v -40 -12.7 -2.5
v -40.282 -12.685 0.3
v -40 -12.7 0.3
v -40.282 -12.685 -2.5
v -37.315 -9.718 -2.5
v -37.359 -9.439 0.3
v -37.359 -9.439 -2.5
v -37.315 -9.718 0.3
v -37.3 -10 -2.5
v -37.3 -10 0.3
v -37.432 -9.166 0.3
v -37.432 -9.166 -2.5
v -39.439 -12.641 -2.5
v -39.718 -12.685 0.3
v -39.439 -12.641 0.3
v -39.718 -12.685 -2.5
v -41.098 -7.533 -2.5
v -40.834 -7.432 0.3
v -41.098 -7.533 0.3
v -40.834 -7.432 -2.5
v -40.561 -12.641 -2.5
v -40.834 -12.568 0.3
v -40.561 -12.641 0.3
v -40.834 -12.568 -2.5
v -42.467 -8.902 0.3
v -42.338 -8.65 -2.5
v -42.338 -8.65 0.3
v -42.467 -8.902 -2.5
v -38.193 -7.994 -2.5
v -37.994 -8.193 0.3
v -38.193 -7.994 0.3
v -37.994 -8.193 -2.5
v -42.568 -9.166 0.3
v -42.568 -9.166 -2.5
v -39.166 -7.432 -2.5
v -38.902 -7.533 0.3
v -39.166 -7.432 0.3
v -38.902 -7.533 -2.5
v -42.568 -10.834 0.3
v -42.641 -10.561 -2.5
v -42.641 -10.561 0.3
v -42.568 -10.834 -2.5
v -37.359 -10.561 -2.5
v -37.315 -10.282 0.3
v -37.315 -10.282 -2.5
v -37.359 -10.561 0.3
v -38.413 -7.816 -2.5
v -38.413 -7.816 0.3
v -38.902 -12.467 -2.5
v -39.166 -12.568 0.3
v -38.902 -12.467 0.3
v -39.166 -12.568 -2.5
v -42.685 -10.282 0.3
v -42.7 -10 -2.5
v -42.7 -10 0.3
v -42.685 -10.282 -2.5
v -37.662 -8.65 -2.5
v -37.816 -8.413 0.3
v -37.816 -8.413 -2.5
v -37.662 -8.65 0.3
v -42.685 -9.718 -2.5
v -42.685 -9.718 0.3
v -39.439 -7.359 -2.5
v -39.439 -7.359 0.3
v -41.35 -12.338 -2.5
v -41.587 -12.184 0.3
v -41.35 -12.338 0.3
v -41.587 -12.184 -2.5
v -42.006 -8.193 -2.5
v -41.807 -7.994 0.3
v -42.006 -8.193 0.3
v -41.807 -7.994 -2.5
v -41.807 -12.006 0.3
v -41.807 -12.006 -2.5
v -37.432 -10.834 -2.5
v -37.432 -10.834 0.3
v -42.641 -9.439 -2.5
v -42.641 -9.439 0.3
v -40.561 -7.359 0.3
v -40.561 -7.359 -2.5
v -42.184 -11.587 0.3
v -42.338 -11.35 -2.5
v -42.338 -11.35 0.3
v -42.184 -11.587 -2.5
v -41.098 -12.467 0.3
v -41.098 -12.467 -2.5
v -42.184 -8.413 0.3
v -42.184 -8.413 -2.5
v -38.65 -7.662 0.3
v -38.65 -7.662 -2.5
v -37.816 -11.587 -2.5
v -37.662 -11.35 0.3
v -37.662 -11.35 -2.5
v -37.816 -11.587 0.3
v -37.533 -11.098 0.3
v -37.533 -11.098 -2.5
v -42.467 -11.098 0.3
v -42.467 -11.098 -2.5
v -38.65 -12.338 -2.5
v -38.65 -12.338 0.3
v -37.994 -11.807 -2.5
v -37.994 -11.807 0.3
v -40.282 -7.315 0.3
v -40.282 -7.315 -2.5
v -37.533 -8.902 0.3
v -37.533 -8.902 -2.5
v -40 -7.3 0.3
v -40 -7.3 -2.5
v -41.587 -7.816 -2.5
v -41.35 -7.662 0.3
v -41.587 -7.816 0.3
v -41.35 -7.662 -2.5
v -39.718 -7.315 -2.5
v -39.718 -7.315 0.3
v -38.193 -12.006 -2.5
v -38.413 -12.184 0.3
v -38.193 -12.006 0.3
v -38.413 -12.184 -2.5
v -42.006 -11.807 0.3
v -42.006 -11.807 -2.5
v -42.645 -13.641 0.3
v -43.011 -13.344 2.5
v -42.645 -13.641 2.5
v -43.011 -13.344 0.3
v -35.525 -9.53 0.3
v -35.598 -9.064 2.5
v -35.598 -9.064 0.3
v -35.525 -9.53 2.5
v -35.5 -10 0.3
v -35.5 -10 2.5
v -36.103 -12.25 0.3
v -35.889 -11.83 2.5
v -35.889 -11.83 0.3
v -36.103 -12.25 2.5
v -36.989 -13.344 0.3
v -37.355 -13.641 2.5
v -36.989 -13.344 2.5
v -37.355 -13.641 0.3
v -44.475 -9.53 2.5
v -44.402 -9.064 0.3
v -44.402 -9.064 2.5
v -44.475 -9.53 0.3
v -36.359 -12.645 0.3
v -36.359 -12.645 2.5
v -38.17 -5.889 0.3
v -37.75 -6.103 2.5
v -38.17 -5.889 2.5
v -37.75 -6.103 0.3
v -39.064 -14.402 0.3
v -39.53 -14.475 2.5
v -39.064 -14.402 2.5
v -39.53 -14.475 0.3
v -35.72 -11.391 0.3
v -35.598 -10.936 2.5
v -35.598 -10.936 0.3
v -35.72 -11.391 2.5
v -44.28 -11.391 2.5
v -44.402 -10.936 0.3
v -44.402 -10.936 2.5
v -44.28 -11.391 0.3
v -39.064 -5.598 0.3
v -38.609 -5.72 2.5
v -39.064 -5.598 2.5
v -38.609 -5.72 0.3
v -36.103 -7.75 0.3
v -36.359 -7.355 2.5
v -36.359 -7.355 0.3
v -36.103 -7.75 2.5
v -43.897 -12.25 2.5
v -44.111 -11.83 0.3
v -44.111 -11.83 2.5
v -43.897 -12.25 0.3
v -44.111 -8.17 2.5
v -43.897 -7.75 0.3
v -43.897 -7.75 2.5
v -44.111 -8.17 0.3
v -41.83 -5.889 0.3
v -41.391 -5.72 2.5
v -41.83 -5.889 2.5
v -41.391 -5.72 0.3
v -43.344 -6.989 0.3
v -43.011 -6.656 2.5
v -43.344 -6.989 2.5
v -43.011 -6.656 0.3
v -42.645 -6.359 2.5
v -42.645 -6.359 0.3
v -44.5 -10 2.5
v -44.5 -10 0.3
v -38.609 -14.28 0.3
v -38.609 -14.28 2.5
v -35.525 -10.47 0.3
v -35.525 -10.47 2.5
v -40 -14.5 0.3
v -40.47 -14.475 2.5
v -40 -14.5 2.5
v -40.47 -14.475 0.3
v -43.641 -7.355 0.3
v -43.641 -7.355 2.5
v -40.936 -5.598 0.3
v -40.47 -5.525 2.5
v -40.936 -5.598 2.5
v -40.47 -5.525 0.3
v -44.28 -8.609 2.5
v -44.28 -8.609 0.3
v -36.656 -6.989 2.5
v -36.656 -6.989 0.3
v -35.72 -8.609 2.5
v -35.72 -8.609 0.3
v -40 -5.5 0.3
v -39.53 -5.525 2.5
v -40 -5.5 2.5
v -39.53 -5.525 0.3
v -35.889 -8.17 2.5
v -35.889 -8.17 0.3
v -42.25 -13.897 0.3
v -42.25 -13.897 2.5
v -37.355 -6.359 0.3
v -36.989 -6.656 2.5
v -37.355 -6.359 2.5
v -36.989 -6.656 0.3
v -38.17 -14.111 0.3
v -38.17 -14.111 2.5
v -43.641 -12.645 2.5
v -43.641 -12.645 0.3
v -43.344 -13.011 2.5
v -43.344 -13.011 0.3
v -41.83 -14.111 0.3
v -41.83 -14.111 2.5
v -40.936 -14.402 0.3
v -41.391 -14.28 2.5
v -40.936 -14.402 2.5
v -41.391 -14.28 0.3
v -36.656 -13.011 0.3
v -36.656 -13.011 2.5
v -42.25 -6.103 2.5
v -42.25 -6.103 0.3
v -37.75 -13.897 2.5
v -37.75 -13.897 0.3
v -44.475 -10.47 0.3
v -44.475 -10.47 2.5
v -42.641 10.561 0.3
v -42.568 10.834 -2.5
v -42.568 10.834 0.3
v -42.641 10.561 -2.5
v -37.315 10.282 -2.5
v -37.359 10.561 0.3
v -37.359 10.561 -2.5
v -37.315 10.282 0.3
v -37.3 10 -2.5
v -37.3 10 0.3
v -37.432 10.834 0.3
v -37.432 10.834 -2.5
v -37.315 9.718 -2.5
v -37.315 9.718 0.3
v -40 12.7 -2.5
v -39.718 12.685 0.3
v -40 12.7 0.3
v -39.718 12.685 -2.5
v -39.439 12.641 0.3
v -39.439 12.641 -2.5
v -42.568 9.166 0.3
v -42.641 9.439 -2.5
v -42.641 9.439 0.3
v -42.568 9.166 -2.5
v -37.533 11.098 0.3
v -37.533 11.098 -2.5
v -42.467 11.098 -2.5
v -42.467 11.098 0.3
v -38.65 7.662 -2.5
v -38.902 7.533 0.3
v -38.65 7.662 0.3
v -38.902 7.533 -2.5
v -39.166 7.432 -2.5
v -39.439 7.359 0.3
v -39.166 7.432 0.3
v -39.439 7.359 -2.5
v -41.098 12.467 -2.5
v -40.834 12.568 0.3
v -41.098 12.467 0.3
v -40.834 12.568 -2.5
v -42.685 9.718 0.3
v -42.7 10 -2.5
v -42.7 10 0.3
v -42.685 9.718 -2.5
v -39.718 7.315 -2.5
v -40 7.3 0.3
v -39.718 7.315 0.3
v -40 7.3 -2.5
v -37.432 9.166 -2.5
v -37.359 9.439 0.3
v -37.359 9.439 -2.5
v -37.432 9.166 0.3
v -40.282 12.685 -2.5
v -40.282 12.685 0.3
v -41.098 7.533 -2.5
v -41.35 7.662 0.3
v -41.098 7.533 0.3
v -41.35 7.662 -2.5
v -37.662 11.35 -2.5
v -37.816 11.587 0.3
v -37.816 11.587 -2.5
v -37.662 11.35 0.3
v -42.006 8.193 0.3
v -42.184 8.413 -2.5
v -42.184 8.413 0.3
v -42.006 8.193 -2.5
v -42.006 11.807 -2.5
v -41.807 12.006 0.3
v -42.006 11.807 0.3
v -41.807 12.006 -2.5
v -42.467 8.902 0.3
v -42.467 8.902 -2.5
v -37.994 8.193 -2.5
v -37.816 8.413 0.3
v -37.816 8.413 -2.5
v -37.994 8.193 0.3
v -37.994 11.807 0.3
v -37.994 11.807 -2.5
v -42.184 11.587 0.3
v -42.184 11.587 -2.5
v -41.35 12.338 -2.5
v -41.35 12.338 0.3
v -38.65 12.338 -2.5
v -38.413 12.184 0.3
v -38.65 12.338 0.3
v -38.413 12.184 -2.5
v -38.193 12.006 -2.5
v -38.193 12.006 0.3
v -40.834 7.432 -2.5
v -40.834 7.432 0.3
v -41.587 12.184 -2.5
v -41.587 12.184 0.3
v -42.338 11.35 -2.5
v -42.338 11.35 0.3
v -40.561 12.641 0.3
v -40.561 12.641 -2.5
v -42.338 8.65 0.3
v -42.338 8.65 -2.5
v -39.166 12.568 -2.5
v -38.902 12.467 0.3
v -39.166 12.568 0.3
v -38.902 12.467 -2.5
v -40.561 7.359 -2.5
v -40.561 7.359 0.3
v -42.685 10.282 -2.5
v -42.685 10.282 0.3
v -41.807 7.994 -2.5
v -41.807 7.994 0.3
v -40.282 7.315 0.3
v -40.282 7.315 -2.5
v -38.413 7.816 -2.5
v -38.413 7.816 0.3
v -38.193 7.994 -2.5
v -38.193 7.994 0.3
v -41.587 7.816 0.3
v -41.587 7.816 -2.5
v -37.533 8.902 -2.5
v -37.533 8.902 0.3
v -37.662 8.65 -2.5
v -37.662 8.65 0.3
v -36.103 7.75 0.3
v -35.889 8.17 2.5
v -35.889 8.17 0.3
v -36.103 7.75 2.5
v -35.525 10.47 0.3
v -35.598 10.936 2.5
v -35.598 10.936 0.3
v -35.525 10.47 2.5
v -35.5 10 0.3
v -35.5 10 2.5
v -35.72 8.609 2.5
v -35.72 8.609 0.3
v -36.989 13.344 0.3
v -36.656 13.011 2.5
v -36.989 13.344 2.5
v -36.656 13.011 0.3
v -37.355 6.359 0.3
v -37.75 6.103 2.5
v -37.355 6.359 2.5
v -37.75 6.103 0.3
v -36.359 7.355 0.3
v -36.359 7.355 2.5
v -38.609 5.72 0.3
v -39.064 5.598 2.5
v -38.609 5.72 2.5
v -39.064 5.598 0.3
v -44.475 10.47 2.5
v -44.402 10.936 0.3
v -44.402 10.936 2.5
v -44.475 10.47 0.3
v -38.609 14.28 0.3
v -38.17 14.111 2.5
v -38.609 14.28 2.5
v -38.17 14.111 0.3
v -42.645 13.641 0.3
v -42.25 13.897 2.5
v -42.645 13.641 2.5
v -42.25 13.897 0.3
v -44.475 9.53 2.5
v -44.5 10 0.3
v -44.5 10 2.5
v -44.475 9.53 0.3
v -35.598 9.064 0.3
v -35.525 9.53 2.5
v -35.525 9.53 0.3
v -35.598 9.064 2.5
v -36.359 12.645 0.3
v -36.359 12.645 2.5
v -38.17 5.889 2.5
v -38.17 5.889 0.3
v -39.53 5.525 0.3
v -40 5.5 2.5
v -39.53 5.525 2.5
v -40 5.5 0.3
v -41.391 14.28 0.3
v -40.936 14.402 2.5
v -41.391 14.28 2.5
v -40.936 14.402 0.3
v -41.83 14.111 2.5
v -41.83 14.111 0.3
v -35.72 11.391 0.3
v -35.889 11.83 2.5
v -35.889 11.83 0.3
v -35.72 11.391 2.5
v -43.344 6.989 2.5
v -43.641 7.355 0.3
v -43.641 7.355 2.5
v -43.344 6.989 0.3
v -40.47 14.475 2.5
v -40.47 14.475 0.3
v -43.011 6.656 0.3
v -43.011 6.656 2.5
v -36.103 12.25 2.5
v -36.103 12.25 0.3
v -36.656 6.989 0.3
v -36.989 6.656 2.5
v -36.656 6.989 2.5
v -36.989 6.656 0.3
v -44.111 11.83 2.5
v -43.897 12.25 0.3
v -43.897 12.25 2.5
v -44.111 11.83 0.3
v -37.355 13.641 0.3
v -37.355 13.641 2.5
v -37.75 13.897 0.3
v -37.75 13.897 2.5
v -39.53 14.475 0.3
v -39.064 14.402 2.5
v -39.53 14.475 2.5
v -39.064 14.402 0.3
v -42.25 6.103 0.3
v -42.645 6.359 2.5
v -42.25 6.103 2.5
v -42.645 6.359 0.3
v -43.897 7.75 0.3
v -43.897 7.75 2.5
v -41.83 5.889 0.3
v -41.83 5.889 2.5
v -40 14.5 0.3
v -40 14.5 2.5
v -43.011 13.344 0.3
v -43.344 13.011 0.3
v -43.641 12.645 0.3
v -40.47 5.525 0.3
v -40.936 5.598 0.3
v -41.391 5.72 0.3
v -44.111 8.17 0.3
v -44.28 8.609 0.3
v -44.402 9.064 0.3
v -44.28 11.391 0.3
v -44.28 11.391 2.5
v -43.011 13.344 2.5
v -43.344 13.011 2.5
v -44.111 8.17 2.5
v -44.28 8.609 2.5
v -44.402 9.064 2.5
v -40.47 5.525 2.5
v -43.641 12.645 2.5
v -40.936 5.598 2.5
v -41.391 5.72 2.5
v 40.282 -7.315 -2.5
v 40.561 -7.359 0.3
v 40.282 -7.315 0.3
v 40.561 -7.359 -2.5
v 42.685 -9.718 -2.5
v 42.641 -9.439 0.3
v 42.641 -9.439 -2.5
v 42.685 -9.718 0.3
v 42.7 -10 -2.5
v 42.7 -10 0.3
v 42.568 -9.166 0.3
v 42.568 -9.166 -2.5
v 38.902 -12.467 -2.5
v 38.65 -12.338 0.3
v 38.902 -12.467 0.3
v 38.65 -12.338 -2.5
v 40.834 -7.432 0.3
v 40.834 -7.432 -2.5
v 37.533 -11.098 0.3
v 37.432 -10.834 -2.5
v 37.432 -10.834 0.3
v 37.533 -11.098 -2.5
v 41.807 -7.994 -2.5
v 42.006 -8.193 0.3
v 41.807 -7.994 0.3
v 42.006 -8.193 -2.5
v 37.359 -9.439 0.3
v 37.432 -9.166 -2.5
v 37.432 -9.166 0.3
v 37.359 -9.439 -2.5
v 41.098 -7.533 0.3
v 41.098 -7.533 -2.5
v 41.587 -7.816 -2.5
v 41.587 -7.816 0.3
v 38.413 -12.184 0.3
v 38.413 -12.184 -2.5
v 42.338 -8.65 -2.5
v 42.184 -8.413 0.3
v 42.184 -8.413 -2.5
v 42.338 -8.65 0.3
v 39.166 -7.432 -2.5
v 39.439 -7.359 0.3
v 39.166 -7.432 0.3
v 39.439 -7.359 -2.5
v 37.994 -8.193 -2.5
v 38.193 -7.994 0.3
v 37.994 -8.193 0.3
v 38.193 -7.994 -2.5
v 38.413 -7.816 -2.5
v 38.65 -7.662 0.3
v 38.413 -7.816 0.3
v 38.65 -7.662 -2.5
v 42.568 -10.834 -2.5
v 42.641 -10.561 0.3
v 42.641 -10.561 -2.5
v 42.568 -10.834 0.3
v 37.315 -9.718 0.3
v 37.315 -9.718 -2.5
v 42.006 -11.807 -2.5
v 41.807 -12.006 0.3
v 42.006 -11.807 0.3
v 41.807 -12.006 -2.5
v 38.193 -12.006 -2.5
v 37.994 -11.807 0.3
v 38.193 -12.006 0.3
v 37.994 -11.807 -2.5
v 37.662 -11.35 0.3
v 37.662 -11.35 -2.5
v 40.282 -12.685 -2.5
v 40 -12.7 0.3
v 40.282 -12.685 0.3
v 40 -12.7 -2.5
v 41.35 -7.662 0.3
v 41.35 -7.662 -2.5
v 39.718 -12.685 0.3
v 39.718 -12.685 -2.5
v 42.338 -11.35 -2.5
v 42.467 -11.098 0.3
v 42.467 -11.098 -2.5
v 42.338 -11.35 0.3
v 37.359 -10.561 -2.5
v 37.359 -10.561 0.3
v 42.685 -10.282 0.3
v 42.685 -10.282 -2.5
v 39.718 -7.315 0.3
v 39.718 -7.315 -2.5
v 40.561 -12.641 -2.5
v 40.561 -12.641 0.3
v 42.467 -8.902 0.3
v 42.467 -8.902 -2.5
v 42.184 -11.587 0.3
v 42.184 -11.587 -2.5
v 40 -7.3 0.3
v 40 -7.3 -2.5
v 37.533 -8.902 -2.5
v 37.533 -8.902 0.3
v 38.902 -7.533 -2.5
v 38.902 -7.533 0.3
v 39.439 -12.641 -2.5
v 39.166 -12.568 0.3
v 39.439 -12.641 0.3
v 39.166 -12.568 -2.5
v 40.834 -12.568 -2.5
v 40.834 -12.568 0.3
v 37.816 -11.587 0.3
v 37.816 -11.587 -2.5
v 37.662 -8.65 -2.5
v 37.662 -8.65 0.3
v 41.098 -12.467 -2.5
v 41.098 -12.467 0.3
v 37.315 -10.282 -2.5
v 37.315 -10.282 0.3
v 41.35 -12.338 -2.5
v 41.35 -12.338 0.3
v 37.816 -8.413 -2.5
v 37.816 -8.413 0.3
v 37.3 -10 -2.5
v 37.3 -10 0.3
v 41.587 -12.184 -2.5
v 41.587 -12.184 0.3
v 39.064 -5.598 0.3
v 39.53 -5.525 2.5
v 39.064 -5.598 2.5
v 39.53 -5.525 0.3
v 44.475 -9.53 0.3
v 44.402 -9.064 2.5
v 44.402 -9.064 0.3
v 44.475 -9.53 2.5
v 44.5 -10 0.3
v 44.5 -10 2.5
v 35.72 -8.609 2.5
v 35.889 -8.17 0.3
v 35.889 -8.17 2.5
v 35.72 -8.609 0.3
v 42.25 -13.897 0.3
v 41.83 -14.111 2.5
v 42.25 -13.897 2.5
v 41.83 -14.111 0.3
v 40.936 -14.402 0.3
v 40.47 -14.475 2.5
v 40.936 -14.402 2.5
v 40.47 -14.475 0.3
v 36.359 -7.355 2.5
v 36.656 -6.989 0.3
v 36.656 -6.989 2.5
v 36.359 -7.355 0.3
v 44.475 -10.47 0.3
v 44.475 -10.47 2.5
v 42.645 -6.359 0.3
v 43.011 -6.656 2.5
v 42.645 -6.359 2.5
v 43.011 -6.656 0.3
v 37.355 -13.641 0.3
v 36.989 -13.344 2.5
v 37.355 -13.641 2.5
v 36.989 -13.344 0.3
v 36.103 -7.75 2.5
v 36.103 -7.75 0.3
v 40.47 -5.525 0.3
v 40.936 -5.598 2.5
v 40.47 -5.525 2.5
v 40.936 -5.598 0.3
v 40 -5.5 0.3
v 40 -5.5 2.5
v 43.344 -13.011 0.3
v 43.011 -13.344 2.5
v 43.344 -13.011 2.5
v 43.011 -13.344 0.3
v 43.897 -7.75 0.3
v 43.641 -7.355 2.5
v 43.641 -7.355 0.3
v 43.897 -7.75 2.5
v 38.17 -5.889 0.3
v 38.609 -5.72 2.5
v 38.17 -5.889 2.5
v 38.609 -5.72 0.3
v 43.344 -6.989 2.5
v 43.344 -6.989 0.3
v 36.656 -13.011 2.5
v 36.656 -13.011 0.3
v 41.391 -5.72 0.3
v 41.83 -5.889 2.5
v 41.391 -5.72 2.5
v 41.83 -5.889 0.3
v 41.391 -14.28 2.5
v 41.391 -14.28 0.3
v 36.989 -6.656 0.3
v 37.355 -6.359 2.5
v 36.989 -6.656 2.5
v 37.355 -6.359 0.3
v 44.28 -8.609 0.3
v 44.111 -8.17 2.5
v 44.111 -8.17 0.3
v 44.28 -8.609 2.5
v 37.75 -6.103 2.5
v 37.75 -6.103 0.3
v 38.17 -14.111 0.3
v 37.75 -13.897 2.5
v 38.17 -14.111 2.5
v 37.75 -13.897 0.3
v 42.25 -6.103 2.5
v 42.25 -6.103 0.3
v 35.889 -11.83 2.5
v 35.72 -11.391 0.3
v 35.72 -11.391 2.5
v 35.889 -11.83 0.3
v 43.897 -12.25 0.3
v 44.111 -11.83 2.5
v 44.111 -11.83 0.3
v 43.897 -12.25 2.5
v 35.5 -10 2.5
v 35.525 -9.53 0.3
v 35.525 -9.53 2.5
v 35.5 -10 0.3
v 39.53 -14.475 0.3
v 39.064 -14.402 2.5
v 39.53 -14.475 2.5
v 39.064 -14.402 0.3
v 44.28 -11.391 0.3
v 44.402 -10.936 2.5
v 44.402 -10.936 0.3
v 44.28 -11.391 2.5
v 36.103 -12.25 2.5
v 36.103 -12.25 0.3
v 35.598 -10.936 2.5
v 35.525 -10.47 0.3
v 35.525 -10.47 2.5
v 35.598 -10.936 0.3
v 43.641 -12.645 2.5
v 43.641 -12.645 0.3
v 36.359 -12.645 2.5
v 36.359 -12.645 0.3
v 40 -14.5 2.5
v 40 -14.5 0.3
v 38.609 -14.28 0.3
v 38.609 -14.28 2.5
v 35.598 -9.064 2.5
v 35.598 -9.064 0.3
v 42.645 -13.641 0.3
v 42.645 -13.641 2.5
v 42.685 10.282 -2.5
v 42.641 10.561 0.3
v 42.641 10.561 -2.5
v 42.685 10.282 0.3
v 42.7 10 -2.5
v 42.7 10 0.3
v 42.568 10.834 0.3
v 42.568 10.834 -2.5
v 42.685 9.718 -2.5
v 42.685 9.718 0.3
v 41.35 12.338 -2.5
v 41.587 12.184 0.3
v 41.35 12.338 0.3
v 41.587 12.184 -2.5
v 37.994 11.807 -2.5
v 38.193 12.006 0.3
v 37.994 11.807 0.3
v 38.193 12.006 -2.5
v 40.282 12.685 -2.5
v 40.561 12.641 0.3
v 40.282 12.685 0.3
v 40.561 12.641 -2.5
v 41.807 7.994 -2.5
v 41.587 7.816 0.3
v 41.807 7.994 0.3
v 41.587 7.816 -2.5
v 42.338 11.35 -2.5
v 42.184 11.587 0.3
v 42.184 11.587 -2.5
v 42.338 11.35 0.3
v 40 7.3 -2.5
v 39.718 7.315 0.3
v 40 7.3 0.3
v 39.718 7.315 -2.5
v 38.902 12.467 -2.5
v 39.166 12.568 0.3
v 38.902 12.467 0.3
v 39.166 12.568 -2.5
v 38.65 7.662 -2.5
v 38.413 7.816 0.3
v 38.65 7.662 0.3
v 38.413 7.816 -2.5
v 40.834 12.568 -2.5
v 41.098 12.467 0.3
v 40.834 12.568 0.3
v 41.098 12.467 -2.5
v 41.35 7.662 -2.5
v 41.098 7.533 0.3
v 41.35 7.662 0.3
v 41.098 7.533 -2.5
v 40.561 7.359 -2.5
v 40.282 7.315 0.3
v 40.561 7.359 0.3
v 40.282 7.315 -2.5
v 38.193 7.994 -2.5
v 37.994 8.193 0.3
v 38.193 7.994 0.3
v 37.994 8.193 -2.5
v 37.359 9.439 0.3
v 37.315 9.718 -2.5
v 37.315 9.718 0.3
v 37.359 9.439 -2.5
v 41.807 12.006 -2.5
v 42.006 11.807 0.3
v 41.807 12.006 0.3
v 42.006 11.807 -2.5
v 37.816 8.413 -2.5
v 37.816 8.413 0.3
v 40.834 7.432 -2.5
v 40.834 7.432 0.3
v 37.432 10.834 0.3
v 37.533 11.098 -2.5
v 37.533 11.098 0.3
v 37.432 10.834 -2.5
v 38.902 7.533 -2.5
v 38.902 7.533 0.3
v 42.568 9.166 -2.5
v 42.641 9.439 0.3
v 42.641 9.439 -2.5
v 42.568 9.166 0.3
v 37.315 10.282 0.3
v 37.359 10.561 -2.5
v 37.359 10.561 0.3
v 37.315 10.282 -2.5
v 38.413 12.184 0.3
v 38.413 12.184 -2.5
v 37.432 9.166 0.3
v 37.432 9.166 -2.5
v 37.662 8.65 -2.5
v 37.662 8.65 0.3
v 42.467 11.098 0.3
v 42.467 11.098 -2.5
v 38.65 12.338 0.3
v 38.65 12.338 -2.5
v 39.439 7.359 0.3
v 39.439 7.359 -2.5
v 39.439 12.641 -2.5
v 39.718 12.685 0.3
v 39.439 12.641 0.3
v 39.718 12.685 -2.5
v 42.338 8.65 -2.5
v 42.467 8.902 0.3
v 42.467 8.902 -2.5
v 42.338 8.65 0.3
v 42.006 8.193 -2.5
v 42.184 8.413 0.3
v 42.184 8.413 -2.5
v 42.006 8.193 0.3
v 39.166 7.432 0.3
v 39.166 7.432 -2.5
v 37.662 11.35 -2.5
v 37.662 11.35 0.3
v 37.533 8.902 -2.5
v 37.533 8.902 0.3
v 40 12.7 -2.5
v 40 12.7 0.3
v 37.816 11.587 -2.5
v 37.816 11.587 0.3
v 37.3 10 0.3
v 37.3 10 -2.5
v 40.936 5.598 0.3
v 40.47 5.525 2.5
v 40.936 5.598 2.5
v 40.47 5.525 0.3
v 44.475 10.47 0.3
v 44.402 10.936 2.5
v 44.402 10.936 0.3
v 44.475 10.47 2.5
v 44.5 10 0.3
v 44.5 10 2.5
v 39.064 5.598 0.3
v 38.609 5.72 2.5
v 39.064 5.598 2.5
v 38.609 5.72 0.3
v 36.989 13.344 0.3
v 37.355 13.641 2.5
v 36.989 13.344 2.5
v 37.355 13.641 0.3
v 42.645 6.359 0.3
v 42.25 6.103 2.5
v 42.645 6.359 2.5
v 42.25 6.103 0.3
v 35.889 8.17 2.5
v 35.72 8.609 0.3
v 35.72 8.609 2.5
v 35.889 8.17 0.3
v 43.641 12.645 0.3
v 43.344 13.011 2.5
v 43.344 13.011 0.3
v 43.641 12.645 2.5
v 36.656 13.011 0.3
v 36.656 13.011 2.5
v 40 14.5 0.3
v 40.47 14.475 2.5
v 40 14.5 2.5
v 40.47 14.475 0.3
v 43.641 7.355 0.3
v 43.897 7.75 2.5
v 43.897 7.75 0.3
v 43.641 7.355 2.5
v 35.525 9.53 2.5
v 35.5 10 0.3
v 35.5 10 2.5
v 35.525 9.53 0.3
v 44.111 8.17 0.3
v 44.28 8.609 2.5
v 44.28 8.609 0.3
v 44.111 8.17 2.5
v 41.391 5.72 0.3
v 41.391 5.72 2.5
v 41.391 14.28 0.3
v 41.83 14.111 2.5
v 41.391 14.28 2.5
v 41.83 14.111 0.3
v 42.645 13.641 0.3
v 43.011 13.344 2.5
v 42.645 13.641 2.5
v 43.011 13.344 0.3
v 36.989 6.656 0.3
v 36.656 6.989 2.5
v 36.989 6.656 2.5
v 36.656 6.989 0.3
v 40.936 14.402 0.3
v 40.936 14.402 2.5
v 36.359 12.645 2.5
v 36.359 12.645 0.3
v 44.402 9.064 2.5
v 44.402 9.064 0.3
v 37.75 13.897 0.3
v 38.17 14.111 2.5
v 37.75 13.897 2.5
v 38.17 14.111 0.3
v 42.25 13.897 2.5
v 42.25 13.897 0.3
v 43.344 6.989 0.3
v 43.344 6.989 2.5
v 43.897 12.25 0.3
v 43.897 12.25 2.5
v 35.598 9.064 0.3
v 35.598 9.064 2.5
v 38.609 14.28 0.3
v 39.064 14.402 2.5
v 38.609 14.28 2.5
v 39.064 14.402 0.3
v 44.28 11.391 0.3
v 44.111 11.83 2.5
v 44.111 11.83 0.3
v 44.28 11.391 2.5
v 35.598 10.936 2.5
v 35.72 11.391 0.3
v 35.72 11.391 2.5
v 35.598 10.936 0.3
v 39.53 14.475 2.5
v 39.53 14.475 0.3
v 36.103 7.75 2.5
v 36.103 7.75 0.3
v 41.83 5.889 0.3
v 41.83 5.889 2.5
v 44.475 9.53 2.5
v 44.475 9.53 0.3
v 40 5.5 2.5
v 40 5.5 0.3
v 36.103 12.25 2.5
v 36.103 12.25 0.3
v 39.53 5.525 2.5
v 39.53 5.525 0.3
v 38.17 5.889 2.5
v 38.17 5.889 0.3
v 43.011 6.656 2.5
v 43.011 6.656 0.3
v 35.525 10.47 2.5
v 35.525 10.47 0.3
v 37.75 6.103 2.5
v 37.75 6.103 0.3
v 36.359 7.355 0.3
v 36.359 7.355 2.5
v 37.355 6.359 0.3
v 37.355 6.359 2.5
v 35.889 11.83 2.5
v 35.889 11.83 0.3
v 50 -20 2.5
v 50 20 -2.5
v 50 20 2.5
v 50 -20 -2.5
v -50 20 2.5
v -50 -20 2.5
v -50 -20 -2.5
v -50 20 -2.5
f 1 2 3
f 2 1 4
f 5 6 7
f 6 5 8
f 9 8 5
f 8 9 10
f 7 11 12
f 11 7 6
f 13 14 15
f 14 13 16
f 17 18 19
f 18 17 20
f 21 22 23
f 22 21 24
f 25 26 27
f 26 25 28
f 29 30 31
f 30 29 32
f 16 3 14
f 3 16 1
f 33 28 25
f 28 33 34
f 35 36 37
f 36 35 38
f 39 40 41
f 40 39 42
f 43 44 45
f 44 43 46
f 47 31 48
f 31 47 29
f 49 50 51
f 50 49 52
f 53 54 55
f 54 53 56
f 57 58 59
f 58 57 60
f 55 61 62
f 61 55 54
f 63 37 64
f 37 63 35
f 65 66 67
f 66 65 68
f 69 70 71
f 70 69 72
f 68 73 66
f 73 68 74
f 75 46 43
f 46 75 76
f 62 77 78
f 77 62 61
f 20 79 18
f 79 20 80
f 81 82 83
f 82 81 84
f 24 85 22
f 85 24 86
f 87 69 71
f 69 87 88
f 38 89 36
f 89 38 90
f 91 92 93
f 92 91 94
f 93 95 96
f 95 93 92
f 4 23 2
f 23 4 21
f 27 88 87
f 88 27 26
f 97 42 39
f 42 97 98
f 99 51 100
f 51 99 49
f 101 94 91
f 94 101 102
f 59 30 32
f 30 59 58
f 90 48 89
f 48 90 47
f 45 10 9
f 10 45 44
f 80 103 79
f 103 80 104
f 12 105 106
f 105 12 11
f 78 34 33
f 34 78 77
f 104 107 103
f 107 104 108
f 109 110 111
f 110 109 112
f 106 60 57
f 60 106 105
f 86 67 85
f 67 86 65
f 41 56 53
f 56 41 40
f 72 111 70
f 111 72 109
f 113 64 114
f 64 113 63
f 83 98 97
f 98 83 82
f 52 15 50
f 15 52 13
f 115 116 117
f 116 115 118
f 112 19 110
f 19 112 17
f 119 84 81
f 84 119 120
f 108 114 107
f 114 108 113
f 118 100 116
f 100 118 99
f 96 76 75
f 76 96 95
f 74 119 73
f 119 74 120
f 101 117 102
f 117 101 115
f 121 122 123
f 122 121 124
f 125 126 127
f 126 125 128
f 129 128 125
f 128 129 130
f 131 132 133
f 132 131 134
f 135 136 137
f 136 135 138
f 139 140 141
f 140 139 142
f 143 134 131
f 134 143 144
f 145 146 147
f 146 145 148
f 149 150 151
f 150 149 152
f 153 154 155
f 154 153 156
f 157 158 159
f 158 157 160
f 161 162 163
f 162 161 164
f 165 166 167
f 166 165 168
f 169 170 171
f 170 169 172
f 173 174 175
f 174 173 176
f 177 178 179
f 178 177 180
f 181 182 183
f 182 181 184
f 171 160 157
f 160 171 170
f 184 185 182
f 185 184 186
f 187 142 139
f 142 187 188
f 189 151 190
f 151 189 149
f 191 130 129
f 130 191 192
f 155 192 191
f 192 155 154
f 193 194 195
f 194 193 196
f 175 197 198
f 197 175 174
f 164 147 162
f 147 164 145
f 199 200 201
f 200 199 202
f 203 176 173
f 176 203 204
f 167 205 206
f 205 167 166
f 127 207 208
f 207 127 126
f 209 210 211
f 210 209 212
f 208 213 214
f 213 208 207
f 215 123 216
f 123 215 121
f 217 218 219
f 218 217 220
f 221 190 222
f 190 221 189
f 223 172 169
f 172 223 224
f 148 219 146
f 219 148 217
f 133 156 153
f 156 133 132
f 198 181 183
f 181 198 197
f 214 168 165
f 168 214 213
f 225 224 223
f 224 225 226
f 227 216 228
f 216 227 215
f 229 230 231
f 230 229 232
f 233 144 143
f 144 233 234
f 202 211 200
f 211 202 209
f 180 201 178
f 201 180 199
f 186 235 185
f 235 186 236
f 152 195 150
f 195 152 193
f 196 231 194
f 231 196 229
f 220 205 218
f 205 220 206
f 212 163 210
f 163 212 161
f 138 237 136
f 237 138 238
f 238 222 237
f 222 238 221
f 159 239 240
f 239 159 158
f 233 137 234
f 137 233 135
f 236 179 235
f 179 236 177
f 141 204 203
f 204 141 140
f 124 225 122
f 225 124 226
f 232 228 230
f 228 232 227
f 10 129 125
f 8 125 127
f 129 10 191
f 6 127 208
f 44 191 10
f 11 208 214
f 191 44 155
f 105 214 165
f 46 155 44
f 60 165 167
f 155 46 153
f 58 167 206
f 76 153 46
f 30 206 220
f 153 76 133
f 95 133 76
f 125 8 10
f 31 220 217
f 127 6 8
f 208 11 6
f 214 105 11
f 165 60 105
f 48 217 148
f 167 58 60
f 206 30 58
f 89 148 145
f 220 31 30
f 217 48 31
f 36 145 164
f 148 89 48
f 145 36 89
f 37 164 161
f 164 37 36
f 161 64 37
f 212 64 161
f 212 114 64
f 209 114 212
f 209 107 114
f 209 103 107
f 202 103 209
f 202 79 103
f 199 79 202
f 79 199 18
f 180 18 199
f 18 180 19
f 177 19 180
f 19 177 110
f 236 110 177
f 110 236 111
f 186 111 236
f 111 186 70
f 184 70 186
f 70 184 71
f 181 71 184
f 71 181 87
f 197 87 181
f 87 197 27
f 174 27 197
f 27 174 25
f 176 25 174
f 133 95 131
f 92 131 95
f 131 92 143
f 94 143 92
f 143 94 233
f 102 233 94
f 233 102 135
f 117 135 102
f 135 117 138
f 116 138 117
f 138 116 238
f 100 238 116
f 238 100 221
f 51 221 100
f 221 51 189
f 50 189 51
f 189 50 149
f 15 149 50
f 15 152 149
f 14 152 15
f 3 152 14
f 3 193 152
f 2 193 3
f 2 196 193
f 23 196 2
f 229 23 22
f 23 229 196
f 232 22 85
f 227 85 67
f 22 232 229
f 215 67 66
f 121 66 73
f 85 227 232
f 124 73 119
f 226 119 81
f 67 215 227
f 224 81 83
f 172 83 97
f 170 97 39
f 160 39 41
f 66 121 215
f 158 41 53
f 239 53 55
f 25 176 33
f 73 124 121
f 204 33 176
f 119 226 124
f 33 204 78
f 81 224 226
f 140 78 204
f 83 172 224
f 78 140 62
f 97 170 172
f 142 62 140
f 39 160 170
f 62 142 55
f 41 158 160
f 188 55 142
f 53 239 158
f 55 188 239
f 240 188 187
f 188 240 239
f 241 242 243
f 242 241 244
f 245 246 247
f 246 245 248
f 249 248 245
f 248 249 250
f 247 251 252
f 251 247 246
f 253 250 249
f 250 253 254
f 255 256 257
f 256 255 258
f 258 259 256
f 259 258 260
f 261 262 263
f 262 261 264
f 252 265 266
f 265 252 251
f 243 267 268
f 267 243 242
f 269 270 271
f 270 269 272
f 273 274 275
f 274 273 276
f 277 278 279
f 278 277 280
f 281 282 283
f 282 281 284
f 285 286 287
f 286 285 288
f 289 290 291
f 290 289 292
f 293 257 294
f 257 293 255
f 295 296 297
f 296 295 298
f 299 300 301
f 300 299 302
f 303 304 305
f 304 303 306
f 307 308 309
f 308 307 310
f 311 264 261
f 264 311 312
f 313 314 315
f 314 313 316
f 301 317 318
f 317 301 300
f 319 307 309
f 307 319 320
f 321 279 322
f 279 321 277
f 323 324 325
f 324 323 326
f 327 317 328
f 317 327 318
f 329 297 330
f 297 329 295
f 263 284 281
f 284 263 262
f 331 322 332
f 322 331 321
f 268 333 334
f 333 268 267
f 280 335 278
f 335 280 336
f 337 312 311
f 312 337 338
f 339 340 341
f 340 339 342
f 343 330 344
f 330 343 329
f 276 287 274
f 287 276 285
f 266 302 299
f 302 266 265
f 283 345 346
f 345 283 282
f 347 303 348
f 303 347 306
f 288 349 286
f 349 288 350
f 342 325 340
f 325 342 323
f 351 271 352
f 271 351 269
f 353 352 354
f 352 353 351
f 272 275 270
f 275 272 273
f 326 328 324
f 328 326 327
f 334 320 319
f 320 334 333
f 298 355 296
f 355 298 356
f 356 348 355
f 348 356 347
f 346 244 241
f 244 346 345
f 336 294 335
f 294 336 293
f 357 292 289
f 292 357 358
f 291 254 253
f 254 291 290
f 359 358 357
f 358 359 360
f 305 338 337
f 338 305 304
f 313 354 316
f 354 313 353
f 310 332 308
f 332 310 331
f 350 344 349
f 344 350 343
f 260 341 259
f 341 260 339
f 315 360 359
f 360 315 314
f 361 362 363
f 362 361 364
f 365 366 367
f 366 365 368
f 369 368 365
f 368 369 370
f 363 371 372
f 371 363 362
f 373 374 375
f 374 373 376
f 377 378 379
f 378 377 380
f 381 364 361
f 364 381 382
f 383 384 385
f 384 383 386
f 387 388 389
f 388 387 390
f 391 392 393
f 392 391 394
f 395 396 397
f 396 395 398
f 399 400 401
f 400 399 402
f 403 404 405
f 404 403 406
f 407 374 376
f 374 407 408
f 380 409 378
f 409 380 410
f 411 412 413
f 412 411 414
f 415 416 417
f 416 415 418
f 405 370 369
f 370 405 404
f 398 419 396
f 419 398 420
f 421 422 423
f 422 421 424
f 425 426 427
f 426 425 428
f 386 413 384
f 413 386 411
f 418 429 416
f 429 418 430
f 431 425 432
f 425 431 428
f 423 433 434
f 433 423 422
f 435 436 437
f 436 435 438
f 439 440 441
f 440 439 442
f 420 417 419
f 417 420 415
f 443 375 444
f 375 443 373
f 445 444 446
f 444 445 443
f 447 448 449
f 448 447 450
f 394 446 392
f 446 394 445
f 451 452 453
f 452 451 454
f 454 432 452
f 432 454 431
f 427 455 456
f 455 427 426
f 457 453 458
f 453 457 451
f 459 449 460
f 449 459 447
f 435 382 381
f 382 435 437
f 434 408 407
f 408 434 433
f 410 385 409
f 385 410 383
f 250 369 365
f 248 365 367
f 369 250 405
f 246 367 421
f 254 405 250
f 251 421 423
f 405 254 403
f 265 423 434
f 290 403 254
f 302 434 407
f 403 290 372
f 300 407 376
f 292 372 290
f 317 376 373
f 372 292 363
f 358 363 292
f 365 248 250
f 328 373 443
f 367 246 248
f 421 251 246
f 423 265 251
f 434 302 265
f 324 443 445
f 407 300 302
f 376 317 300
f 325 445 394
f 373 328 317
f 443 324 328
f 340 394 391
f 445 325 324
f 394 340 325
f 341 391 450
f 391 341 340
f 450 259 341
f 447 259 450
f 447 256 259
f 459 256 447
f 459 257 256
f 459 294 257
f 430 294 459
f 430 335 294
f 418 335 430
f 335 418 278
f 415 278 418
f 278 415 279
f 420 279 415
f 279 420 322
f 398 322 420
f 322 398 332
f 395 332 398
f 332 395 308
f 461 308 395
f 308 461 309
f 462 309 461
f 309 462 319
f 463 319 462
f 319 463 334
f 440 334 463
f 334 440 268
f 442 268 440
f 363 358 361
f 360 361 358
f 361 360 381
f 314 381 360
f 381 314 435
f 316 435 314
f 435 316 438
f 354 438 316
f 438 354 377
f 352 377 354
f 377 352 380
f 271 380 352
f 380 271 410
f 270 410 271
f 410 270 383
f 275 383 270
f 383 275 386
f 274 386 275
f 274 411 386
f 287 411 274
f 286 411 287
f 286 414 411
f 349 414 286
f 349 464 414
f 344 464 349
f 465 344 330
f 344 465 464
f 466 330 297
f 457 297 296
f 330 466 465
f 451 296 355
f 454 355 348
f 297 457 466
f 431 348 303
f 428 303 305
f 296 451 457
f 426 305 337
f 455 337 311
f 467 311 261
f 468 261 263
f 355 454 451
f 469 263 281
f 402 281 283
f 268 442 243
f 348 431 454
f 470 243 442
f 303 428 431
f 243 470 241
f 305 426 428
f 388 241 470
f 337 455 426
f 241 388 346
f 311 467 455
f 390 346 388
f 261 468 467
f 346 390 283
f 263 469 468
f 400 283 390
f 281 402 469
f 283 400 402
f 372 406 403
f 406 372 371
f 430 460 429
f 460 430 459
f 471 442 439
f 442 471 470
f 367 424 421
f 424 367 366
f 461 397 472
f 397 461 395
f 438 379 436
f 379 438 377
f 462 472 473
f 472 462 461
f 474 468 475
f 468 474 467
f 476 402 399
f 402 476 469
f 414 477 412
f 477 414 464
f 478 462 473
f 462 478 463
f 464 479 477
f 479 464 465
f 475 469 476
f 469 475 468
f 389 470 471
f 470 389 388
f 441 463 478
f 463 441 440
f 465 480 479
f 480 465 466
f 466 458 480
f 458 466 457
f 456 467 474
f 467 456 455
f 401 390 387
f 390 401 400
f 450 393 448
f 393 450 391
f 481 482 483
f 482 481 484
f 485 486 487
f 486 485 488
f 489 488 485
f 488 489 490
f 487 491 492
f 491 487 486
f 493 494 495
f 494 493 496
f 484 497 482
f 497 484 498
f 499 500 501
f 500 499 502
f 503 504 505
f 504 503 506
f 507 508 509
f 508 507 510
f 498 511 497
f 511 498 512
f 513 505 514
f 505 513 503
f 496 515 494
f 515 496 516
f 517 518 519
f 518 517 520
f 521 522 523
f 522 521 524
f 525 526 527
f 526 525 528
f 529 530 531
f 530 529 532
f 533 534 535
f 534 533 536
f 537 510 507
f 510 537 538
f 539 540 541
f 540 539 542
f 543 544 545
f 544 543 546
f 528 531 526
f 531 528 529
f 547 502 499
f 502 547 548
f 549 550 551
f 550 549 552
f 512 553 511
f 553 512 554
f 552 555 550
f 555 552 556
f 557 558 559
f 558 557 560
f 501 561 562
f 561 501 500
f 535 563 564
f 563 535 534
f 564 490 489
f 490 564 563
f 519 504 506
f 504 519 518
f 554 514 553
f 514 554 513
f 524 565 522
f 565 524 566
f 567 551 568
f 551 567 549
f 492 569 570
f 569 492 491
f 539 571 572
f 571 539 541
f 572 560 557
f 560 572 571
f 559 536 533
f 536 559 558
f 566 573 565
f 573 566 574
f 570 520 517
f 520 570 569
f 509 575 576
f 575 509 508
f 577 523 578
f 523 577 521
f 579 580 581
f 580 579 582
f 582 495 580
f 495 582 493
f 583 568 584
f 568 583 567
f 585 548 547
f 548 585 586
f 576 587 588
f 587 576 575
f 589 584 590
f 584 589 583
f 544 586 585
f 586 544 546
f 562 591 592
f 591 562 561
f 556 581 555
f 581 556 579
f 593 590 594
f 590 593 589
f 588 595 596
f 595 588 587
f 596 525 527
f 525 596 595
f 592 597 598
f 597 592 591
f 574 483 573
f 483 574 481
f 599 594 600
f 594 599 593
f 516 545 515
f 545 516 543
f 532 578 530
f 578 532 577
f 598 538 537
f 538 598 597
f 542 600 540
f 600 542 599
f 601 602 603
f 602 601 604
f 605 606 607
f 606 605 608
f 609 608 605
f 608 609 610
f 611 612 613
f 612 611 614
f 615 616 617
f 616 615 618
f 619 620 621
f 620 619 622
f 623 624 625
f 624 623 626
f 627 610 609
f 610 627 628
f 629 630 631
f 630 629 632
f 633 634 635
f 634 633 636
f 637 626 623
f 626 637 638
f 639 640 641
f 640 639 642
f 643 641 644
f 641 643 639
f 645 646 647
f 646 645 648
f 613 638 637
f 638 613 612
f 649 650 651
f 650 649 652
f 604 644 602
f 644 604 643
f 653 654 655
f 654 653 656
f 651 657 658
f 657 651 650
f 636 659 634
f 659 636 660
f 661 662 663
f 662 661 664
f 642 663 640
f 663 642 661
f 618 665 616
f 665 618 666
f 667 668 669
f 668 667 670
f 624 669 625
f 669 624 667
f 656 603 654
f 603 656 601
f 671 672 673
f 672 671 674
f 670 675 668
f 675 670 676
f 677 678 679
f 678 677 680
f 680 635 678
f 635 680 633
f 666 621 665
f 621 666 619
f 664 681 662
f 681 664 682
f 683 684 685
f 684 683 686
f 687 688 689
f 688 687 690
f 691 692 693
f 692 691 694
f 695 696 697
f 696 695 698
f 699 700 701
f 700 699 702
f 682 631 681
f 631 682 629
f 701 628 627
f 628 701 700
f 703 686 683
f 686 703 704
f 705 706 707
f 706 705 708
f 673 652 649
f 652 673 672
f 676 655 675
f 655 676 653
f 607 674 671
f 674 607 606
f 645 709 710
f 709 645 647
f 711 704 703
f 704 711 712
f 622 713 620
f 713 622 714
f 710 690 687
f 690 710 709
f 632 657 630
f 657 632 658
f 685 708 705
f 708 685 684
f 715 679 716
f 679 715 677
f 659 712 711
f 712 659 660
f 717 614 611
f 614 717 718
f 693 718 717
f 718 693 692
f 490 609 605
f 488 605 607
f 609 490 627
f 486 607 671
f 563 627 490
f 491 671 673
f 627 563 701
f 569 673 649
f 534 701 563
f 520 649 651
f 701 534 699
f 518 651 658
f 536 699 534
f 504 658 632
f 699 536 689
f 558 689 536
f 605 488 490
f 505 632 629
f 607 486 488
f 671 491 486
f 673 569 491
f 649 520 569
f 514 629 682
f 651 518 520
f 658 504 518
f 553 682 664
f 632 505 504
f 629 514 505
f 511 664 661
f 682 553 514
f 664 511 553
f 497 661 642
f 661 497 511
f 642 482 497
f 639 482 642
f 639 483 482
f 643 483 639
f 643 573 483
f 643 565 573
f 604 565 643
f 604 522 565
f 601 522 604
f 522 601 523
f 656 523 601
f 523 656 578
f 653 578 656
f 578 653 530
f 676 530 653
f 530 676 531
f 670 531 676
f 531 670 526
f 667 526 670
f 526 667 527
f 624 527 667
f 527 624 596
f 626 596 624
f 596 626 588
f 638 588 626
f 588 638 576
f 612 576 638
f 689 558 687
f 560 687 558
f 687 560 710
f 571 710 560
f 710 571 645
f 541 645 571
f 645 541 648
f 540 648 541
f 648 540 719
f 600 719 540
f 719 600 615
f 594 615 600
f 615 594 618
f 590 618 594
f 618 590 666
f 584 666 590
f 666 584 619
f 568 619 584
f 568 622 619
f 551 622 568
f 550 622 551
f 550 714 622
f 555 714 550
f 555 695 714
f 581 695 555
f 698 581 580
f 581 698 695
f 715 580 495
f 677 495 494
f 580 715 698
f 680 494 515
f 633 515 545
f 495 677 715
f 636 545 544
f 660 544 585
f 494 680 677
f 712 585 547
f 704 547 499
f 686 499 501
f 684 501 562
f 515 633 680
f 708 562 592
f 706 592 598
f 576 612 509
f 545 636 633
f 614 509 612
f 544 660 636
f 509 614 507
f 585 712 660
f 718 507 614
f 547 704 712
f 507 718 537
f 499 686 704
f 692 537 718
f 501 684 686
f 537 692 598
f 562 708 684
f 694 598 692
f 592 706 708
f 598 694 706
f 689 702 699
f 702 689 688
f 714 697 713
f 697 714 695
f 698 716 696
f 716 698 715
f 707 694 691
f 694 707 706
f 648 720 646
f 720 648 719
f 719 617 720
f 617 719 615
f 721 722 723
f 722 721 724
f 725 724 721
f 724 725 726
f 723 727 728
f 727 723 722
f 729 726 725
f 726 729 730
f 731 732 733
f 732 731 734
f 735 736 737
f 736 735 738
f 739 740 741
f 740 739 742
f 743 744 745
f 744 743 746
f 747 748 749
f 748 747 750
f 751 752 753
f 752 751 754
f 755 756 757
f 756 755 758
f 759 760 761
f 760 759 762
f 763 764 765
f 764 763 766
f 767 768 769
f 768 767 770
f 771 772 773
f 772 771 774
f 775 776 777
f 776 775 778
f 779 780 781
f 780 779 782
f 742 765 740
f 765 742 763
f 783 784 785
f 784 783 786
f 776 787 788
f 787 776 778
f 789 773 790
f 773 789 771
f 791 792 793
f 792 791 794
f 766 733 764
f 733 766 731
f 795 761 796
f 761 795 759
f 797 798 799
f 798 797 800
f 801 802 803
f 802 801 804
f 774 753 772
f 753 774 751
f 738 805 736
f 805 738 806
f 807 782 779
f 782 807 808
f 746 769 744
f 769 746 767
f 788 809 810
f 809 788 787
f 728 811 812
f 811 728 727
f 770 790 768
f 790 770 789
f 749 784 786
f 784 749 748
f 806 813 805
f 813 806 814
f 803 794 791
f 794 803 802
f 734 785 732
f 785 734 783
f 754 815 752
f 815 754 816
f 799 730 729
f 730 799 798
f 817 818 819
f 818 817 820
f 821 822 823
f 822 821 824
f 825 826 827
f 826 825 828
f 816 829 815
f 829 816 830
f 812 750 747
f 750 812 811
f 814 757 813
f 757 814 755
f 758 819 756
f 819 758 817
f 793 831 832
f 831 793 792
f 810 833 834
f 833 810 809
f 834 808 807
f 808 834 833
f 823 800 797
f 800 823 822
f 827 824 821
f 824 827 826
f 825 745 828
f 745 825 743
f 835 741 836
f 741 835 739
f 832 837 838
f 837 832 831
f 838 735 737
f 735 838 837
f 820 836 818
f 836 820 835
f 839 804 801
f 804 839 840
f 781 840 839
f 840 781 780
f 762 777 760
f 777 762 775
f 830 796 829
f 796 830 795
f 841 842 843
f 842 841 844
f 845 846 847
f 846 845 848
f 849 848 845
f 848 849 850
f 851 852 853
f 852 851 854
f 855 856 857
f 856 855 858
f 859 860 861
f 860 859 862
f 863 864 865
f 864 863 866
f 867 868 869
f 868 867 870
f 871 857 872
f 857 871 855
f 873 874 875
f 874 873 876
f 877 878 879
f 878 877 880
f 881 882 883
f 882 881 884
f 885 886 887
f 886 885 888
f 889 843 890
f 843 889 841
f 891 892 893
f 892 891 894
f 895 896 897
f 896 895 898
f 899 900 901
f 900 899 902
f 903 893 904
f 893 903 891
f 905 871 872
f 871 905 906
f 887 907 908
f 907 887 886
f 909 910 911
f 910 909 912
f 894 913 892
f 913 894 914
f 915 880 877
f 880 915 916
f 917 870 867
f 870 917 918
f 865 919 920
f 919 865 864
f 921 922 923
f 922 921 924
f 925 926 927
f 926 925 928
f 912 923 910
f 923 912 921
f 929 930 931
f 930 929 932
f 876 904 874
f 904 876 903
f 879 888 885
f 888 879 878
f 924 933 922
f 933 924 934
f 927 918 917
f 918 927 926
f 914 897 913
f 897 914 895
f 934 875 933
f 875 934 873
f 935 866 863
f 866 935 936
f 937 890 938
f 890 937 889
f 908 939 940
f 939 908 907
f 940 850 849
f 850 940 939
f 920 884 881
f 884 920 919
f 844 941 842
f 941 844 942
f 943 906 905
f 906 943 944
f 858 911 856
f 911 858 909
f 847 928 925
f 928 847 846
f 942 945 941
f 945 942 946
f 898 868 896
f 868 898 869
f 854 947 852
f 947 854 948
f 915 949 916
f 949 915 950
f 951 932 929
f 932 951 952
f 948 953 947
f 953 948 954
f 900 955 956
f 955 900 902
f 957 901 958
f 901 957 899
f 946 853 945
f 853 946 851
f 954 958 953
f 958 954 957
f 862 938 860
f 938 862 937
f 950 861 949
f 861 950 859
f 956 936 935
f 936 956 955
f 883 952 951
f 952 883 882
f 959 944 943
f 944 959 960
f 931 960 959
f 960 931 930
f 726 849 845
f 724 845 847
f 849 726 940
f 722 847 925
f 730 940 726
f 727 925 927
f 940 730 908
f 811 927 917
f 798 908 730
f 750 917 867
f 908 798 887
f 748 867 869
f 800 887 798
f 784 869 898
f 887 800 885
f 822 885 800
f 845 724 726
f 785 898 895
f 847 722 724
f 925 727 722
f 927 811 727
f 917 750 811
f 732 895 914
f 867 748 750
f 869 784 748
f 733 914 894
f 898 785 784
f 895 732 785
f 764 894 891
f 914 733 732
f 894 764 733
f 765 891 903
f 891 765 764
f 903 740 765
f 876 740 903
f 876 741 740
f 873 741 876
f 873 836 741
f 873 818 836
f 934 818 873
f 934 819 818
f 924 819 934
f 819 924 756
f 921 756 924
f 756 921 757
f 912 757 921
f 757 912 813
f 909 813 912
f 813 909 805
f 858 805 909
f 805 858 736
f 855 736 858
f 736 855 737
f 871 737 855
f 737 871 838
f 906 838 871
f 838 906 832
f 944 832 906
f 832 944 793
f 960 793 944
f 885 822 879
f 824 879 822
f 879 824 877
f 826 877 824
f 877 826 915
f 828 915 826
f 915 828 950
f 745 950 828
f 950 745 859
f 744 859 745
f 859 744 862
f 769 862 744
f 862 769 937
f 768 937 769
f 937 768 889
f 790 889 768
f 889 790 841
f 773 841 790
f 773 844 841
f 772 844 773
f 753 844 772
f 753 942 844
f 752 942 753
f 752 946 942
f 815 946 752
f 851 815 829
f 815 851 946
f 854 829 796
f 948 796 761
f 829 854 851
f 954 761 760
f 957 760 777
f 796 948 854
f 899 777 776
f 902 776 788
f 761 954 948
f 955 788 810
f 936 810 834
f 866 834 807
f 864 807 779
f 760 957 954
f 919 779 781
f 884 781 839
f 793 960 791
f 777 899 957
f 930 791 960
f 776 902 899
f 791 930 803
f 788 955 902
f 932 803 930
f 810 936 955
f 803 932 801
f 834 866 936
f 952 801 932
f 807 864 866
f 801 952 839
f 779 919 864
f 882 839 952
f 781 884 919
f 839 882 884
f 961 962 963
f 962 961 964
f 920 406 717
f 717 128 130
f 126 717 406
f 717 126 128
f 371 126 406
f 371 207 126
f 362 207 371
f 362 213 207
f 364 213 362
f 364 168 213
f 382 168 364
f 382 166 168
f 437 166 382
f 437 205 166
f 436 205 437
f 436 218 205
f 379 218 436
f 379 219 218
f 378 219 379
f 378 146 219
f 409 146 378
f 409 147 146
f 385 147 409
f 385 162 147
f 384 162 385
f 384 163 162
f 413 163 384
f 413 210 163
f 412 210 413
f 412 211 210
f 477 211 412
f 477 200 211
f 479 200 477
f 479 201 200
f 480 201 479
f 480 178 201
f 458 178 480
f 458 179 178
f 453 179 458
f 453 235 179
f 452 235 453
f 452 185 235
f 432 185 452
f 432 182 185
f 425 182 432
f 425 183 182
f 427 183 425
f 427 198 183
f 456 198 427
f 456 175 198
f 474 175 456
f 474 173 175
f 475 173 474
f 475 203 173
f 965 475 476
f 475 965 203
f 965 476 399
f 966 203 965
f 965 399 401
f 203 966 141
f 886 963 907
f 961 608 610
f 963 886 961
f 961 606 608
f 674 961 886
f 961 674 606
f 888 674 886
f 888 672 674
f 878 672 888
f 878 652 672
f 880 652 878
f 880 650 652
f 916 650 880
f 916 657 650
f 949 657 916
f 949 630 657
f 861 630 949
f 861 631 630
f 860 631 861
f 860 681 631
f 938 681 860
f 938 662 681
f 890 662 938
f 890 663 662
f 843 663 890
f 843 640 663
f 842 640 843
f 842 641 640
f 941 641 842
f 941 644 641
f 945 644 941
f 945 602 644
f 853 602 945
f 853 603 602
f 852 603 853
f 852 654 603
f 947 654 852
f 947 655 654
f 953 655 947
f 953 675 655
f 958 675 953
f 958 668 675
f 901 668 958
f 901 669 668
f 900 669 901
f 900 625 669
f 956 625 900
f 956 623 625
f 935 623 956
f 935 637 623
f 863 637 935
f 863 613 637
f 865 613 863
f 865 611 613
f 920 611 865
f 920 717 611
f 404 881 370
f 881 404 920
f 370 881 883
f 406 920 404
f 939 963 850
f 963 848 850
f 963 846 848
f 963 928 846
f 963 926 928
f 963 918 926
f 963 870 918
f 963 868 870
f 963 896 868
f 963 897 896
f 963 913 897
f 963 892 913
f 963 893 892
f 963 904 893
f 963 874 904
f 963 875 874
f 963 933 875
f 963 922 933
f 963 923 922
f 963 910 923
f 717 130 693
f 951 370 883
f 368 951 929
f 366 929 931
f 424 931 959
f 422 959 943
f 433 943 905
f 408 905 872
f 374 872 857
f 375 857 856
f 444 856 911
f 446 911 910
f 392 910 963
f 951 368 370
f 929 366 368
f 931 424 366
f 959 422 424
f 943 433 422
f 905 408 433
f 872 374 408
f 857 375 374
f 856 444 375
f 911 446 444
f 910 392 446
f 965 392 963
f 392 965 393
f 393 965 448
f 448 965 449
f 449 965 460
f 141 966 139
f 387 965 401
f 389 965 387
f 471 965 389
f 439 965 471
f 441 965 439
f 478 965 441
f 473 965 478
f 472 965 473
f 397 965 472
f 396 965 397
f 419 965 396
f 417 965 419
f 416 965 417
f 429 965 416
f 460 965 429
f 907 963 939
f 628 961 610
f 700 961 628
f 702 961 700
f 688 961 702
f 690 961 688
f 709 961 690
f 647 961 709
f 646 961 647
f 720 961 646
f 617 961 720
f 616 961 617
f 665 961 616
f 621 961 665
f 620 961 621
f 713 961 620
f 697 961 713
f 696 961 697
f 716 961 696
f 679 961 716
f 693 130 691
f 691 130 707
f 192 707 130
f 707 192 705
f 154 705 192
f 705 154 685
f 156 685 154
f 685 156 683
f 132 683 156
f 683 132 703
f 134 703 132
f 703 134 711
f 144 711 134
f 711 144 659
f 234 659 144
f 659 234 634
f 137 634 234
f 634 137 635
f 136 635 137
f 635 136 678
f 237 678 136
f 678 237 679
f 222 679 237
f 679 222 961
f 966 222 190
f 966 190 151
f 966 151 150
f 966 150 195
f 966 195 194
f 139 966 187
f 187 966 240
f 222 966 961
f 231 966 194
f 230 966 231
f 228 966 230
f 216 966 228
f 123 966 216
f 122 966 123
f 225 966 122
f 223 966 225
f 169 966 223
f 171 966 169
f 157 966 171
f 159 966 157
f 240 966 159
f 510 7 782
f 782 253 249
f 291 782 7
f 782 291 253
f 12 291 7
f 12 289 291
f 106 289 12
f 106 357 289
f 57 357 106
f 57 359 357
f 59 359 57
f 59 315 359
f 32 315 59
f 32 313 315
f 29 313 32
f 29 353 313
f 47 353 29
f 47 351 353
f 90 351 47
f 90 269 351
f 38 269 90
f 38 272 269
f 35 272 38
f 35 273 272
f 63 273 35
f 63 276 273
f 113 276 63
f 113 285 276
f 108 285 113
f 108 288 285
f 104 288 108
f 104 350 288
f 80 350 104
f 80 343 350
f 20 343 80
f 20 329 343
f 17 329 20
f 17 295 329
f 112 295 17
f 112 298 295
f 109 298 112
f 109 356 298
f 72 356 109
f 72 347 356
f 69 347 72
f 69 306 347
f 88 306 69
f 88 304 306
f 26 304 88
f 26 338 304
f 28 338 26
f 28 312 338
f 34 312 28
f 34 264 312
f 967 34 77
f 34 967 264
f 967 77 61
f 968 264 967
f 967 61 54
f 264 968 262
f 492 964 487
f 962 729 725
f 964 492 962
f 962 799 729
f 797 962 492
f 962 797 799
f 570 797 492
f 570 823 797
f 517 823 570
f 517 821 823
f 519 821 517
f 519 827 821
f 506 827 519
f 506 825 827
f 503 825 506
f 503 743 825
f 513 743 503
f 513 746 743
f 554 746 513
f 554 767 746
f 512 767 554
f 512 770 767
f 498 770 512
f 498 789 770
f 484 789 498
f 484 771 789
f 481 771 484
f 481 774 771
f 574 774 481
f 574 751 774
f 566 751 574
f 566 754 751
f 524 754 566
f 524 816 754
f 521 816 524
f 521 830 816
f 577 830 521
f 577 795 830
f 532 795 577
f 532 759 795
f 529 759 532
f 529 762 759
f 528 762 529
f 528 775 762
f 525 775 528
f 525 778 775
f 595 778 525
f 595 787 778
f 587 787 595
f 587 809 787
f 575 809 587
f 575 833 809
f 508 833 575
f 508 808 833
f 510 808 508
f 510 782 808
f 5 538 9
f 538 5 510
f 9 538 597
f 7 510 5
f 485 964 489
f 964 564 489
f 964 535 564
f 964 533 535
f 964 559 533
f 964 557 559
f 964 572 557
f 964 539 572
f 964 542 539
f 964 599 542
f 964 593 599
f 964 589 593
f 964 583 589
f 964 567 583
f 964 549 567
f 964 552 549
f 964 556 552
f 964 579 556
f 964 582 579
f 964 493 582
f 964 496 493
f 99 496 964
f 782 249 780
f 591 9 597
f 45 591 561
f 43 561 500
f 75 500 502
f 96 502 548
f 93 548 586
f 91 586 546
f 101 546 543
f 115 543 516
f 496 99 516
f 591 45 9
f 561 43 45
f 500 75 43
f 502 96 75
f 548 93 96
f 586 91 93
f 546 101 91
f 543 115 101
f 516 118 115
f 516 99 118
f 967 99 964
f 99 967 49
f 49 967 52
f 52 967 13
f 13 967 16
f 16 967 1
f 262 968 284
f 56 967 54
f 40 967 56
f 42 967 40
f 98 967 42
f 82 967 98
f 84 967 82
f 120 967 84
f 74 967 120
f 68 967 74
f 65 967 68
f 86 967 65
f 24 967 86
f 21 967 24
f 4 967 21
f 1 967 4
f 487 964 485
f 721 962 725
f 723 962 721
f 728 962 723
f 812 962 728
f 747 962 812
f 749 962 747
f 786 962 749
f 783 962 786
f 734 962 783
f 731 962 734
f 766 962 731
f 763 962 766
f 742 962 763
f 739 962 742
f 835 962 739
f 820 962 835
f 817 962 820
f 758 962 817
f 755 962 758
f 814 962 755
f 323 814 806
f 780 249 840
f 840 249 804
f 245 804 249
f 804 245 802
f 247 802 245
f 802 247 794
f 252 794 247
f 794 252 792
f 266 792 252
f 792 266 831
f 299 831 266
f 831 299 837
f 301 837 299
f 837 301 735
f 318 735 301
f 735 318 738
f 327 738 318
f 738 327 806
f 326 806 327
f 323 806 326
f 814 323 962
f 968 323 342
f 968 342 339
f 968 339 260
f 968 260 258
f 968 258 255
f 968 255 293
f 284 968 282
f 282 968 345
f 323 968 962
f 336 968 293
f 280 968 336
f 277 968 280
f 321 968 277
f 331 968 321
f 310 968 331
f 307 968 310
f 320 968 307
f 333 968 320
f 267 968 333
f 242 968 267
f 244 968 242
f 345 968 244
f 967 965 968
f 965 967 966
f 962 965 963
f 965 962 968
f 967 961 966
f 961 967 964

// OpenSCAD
// 2020 joining plate 100 mm: joining plate for T-slot aluminium profiles.
$fn = 60;
eps = 0.02;
plate_l = 100;
plate_w = 40;
plate_t = 5;
hole_d = 5.4;
counterbore_d = 9;
counterbore_h = 2.2;
edge = 10;

module mounting_hole(x, y) {
    translate([x, y, -plate_t / 2 - eps]) cylinder(d = hole_d, h = plate_t + 2 * eps);
    translate([x, y, plate_t / 2 - counterbore_h]) cylinder(d = counterbore_d, h = counterbore_h + eps);
}

difference() {
    cube([plate_l, plate_w, plate_t], center = true);
    for (x = [-plate_l / 2 + edge, plate_l / 2 - edge], y = [-plate_w / 2 + edge, plate_w / 2 - edge])
        mounting_hole(x, y);
}
